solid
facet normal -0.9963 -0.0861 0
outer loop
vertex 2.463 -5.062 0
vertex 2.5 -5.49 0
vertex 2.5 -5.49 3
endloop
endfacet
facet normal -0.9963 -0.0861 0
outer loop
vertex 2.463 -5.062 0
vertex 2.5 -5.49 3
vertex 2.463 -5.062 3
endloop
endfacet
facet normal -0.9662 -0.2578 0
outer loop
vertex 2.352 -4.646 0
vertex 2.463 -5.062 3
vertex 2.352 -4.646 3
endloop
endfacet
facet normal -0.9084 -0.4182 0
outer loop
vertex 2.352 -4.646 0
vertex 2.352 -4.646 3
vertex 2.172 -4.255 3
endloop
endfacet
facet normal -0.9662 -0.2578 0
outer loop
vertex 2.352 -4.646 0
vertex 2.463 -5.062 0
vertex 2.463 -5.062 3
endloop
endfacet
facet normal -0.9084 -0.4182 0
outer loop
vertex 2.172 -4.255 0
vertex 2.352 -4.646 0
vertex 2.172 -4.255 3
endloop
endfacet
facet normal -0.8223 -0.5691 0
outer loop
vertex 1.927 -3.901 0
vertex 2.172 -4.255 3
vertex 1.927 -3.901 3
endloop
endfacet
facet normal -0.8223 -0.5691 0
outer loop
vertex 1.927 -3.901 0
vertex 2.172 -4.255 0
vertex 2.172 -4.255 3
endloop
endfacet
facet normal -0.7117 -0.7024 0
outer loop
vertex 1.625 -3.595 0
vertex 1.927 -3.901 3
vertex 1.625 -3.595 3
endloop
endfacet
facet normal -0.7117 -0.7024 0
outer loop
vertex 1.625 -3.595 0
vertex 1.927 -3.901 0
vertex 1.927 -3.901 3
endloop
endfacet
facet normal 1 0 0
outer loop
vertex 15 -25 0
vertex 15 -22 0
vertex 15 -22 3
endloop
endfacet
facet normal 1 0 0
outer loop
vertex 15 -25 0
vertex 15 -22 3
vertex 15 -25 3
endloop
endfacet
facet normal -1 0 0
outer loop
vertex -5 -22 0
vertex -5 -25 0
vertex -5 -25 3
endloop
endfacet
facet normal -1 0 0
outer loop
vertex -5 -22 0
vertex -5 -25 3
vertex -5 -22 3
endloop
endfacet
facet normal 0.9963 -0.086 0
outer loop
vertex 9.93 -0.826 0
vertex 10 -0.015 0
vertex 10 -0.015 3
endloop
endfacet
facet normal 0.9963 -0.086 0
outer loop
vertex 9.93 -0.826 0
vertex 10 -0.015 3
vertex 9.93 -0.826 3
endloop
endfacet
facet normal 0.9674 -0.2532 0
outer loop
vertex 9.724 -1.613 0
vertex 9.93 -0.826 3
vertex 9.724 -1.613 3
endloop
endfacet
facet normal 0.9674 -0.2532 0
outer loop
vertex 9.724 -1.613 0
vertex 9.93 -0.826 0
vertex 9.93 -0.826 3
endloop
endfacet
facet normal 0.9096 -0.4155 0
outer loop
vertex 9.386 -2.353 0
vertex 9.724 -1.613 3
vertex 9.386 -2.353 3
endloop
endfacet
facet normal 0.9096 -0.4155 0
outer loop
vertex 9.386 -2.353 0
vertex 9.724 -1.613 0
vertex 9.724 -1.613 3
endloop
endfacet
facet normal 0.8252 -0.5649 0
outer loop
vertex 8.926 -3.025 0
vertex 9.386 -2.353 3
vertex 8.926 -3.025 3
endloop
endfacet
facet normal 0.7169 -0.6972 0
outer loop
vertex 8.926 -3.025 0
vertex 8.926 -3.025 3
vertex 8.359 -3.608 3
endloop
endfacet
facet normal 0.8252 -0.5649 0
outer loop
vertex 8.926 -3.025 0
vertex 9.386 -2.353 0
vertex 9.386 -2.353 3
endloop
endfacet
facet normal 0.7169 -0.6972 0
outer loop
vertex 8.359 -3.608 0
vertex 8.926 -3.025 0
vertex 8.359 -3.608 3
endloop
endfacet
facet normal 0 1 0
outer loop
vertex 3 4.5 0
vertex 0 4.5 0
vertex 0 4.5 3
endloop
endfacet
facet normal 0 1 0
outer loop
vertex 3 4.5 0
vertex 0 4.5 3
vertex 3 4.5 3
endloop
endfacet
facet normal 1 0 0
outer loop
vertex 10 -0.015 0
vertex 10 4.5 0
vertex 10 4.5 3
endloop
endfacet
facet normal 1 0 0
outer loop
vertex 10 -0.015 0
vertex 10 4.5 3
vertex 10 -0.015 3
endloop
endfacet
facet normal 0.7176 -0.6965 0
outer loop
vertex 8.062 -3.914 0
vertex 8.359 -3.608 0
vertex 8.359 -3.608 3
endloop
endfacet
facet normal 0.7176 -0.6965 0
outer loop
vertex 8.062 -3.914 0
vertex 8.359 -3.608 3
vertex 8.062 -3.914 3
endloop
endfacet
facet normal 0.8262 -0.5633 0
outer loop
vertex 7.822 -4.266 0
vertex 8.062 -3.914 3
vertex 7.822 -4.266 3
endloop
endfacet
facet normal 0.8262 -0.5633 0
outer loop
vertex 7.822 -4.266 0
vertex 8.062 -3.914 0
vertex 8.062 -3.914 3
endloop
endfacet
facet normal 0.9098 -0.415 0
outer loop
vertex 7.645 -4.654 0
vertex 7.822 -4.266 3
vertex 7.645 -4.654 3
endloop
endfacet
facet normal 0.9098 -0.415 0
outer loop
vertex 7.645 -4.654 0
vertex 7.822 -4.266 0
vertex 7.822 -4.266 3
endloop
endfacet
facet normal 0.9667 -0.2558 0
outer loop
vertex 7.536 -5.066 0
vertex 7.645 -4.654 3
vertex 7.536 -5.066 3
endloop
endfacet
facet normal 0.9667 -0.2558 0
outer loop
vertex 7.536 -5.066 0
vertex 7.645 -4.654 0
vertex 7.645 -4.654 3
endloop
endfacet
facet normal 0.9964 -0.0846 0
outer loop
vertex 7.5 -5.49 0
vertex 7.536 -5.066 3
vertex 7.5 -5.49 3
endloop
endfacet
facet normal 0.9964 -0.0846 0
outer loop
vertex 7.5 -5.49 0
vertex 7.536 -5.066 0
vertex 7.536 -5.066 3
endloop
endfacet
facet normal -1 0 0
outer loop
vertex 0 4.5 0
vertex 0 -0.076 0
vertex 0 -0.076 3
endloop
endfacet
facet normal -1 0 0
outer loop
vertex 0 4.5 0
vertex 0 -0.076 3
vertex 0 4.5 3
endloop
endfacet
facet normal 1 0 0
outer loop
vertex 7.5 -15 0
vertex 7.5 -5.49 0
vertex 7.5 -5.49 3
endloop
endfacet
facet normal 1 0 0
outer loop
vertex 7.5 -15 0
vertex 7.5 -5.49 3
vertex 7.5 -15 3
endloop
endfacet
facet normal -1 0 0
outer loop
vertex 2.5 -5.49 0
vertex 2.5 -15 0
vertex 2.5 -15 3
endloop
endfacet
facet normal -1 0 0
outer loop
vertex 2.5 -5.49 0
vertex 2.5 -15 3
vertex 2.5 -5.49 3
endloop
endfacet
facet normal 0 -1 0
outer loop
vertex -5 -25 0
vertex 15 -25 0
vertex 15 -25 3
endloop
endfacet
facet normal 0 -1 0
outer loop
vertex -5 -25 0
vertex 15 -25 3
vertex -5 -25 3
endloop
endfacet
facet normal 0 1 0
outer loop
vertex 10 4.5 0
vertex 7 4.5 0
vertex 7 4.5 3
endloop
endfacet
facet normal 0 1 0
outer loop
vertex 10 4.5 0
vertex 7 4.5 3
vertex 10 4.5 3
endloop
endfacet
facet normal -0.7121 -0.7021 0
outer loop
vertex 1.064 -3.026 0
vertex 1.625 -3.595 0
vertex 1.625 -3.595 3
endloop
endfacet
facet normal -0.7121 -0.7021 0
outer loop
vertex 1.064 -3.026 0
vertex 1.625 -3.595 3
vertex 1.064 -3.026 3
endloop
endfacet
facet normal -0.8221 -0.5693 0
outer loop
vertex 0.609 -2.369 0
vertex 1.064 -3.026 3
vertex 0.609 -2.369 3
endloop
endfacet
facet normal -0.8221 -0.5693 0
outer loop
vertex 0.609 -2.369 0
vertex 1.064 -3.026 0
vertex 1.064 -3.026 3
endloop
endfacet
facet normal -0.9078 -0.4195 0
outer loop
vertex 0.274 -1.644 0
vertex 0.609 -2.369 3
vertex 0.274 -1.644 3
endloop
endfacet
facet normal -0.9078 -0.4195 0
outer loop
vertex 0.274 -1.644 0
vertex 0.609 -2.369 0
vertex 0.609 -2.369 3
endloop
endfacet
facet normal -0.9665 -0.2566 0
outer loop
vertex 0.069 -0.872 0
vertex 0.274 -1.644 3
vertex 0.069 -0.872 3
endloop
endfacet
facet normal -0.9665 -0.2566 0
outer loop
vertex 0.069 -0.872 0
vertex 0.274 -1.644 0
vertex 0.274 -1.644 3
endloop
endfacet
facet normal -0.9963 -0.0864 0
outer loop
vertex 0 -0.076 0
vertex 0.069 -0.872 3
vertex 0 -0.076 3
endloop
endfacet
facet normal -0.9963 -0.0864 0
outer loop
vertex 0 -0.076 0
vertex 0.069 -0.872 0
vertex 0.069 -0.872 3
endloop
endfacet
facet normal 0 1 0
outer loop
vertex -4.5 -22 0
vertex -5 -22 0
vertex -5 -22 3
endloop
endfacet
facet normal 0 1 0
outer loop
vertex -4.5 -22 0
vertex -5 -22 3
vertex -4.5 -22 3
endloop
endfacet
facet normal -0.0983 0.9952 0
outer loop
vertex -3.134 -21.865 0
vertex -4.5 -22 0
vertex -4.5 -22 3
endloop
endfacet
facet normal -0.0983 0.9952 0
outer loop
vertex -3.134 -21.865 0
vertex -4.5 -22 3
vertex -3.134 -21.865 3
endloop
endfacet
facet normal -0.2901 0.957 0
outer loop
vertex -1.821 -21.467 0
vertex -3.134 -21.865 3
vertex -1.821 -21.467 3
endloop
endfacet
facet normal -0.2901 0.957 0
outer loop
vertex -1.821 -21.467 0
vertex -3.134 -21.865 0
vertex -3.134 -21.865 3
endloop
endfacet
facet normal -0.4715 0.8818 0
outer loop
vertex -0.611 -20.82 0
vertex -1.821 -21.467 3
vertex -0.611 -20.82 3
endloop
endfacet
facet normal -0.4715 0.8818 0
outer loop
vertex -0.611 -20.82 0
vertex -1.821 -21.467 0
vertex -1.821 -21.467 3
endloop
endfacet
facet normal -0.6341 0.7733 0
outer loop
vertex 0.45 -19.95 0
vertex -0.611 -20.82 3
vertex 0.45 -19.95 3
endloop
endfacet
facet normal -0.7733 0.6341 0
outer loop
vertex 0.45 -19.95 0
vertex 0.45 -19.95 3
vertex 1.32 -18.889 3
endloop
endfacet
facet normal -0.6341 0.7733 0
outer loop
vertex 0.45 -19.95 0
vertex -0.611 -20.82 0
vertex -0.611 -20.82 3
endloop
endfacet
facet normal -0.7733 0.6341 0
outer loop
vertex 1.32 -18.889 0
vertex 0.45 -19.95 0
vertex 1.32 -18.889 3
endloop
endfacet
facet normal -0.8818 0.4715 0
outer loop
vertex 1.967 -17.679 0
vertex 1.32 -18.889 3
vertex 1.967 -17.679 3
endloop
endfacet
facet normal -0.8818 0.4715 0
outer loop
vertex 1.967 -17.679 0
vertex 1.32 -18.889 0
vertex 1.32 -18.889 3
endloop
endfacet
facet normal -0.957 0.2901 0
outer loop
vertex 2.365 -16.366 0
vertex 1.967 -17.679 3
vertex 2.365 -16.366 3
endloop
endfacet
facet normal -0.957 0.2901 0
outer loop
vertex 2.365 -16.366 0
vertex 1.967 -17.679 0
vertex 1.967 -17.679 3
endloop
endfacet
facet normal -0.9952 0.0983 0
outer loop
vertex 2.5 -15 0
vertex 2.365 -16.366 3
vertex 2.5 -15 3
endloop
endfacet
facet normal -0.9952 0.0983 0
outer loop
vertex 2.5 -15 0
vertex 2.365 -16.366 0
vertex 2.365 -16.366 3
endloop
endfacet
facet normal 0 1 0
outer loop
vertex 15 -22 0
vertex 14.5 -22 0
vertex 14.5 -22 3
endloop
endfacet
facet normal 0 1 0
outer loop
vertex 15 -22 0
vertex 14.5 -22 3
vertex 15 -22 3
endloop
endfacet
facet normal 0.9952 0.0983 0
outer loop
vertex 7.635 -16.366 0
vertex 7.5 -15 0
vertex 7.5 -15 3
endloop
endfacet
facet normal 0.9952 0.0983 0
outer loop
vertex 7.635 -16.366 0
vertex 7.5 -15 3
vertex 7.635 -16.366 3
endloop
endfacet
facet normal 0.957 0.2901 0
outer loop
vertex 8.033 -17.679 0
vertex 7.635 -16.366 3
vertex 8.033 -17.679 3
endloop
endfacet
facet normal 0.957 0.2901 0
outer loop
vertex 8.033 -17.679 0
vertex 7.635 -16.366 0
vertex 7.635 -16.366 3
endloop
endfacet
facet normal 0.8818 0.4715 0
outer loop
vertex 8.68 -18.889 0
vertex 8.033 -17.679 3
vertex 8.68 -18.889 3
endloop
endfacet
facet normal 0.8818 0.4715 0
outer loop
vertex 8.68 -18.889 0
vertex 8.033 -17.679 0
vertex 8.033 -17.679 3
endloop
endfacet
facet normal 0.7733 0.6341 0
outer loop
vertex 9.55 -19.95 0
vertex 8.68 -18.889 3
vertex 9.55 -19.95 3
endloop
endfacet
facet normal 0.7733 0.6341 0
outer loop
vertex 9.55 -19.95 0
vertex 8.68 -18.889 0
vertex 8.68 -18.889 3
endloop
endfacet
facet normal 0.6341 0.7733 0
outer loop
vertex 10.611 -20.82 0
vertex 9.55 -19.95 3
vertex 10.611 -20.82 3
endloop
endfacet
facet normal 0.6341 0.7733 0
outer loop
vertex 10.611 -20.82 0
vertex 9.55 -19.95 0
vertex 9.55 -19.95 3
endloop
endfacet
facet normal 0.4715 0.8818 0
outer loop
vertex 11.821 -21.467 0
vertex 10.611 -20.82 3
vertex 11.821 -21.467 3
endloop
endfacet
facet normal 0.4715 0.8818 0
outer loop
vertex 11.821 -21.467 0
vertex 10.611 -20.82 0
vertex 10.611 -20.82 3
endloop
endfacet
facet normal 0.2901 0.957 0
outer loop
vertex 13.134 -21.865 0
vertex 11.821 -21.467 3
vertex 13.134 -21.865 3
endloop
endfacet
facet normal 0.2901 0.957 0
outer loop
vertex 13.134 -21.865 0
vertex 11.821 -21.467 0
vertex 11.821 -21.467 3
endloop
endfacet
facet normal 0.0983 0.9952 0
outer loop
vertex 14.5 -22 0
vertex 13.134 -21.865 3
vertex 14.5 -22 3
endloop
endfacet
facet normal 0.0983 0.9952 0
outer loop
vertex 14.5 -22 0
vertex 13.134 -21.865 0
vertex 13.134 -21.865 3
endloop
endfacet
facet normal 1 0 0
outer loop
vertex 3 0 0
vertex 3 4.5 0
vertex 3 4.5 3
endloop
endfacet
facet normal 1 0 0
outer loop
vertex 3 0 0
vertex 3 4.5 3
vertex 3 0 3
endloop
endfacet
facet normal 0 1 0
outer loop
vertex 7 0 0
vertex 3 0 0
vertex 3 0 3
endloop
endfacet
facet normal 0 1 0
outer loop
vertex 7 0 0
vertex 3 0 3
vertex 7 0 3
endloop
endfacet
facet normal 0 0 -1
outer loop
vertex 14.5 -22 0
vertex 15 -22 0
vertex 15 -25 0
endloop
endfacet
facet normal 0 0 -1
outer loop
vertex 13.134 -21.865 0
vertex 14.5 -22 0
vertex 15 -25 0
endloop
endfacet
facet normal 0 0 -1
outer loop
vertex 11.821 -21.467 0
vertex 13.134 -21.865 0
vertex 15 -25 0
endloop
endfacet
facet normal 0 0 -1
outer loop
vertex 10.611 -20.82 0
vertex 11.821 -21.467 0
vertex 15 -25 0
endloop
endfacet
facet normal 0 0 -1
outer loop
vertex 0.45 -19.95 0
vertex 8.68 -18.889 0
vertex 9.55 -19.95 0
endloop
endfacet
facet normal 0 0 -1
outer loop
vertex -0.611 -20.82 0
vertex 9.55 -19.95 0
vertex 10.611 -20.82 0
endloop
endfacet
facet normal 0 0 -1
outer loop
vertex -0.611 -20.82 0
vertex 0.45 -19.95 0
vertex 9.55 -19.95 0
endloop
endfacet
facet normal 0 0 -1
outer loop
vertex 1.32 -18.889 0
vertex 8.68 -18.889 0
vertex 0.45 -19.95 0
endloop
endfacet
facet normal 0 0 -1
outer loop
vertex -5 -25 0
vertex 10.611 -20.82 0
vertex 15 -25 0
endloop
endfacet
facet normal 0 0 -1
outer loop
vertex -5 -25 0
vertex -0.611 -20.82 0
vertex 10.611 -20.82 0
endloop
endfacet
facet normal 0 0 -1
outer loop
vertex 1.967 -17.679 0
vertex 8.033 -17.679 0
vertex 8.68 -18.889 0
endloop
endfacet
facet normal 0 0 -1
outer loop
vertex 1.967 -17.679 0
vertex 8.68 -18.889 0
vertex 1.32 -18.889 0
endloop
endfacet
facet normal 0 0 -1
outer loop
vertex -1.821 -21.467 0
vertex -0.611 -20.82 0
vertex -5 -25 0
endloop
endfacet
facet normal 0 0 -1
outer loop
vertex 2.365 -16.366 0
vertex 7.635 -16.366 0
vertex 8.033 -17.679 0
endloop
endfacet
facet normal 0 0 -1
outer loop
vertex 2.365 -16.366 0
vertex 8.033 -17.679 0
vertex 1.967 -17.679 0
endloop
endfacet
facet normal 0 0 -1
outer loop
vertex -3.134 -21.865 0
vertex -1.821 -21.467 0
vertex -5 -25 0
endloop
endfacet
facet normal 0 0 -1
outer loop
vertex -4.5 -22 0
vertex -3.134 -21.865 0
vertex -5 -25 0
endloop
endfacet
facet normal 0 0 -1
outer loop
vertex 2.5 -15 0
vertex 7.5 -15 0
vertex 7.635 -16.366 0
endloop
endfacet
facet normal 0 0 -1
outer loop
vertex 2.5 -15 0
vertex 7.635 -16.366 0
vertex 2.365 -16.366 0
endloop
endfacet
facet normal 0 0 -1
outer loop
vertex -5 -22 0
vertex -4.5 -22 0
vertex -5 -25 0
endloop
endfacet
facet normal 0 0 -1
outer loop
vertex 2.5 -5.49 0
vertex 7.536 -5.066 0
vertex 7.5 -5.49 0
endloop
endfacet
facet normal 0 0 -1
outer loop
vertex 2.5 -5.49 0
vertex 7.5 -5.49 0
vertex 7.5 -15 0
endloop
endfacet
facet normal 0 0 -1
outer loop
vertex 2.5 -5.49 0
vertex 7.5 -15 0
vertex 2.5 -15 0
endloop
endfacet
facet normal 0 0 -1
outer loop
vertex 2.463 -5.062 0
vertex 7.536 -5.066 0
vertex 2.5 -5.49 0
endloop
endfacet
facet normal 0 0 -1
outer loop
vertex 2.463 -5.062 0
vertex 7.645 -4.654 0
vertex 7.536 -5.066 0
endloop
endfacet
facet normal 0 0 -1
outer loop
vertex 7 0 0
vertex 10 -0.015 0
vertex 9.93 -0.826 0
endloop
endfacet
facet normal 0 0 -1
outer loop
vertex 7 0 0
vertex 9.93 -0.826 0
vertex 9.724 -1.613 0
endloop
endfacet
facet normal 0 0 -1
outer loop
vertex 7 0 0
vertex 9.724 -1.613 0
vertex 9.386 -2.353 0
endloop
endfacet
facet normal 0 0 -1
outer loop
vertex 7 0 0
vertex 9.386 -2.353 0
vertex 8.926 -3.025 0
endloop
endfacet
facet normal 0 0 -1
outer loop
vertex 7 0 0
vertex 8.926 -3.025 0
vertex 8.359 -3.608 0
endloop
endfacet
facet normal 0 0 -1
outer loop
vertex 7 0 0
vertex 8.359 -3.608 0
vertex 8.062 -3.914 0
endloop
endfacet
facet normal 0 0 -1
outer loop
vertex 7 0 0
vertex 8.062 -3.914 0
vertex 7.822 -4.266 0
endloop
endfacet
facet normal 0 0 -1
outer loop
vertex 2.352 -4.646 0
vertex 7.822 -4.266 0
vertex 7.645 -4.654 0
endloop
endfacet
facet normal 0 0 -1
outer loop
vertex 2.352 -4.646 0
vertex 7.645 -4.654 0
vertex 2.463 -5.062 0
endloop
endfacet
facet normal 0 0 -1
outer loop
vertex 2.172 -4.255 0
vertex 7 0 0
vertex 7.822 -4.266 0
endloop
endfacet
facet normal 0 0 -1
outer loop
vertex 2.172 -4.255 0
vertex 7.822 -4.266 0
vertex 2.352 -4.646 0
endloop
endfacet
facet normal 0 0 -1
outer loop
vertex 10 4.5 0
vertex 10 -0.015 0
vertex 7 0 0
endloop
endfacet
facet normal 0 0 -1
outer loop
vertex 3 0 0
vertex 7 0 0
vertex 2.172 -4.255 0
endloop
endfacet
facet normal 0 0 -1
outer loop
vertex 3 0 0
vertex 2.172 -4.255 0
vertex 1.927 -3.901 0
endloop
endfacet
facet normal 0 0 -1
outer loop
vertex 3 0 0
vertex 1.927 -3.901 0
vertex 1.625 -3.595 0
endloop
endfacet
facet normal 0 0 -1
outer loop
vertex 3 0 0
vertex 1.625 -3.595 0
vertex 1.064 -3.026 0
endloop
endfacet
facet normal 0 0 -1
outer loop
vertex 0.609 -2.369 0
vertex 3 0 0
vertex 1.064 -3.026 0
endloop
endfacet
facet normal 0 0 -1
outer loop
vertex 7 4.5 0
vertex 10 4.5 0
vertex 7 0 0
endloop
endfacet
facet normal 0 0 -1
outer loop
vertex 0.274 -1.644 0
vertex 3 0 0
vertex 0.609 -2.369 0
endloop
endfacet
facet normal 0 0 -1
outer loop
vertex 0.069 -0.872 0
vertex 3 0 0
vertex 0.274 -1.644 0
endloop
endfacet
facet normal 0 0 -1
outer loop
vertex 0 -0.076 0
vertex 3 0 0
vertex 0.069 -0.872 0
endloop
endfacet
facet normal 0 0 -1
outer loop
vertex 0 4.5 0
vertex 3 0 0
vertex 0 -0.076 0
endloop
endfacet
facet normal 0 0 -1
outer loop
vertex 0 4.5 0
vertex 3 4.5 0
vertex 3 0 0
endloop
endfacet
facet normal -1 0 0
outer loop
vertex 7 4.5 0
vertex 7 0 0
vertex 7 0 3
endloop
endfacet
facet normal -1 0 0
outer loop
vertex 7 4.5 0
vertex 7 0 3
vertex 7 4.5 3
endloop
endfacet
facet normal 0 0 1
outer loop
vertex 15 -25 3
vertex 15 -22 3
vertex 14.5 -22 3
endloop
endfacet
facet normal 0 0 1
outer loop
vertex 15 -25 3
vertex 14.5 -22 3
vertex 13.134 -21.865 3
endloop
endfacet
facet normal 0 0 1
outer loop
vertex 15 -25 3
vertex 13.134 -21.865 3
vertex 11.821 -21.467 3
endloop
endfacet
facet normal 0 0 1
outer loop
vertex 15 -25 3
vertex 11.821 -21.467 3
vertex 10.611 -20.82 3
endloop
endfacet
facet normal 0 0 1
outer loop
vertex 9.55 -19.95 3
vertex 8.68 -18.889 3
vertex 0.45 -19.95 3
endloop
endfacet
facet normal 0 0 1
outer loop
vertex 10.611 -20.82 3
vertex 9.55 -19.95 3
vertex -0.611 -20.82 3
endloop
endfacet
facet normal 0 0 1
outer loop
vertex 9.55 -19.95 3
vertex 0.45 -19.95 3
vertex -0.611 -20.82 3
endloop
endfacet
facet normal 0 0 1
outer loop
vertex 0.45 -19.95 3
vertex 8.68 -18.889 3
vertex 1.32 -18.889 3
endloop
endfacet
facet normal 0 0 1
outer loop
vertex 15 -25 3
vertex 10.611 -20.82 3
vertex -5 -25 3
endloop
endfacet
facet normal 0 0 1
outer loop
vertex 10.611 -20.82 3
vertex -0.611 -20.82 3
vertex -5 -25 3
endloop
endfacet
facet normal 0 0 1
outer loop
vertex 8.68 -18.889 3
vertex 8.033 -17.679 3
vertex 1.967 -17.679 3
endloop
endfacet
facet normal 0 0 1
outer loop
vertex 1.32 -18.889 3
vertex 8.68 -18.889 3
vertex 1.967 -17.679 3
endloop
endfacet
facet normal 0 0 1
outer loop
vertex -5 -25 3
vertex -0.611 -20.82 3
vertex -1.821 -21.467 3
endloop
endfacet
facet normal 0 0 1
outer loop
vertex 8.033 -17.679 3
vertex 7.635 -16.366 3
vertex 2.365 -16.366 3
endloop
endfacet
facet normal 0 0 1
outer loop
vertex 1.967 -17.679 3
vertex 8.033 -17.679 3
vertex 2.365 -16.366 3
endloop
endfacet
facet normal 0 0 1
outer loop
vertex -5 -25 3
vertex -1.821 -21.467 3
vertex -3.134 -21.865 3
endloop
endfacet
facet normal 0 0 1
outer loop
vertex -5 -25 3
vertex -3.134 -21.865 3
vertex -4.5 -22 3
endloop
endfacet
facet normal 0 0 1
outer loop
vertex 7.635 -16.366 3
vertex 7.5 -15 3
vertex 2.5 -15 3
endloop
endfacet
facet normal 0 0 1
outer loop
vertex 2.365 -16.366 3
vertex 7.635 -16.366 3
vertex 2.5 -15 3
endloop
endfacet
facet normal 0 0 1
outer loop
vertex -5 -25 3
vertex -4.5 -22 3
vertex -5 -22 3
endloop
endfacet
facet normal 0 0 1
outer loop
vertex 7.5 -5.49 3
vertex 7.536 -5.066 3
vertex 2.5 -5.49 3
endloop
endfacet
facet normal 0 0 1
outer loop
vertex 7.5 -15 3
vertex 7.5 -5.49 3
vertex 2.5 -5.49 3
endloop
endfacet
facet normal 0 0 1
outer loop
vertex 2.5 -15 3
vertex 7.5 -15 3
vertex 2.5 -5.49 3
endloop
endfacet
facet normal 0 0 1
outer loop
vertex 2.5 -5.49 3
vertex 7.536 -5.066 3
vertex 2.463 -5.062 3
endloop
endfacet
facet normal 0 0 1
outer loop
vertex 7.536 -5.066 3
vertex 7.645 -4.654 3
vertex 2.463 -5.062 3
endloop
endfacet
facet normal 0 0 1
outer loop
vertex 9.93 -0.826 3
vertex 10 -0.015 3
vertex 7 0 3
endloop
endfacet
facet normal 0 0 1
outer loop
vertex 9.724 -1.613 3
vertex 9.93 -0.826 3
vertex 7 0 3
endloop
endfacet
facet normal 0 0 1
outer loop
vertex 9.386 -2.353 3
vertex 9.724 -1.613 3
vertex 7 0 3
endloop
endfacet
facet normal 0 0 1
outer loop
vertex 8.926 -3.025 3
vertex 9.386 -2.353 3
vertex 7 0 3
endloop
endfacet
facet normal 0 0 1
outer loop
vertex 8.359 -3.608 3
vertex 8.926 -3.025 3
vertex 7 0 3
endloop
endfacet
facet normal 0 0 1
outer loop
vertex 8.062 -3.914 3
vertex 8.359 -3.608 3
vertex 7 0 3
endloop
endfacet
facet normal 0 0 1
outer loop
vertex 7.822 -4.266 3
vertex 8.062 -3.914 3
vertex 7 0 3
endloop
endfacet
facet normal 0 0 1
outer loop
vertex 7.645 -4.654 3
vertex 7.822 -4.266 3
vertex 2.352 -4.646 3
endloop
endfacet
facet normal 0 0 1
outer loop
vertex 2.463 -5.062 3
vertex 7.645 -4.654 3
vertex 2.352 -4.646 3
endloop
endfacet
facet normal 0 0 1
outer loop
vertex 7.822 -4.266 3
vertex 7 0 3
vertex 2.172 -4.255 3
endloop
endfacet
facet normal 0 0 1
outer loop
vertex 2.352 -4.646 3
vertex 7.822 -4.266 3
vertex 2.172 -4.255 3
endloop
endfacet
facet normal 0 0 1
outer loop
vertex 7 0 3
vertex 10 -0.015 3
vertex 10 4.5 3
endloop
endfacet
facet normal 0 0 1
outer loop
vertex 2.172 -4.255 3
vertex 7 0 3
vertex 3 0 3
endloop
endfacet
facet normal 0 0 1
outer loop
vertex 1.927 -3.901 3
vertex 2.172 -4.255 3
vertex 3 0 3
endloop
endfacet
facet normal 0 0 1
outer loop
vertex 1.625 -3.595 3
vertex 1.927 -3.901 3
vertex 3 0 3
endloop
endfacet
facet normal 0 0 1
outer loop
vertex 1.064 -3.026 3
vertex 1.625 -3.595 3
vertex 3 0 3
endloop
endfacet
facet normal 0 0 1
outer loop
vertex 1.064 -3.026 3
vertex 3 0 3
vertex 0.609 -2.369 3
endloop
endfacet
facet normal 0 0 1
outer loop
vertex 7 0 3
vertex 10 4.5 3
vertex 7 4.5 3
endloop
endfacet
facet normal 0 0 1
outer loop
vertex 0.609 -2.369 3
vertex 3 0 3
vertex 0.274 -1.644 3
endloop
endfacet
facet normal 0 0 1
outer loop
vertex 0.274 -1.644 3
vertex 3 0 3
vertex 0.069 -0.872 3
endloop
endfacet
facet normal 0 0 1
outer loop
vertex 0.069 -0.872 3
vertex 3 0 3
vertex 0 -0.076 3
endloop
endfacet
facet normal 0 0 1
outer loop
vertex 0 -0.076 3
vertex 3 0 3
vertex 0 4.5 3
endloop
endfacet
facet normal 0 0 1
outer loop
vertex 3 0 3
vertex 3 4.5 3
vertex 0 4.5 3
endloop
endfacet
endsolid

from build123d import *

# Parameters (mm, degrees)
RESSALTO_EXTRUS_O1_DEPTH = 3


with BuildPart() as part:
    # Esboço1 → Ressalto-extrusão1 (new body)
    with BuildSketch(Plane.XY):
        with BuildLine():
            Line((3, 0), (7, 0))
            Line((7, 0), (7, 3))
            Line((7, 3), (7, 4.5))
            Line((7, 4.5), (10, 4.5))
            Line((10, 4.5), (10, 3))
            Line((10, 3), (10, 0))
            Line((10, 0), (10, -0.015366586))
            ThreePointArc((10, -0.015366586), (9.570424226, -1.990324177), (8.359319479, -3.608415065))
            ThreePointArc((8.359319479, -3.608415065), (7.72499373, -4.455903043), (7.5, -5.490302797))
            Line((7.5, -5.490302797), (7.5, -6.25))
            Line((7.5, -6.25), (7.5, -12.5))
            Line((7.5, -12.5), (7.5, -15))
            ThreePointArc((7.5, -15), (9.550252532, -19.949747468), (14.5, -22))
            Line((14.5, -22), (15, -22))
            Line((15, -22), (15, -25))
            Line((15, -25), (-5, -25))
            Line((-5, -25), (-5, -22))
            Line((-5, -22), (-4.5, -22))
            ThreePointArc((-4.5, -22), (0.449747468, -19.949747468), (2.5, -15))
            Line((2.5, -15), (2.5, -12.5))
            Line((2.5, -12.5), (2.5, -6.25))
            Line((2.5, -6.25), (2.5, -5.490302797))
            ThreePointArc((2.5, -5.490302797), (2.270627847, -4.446367624), (1.62476455, -3.594738109))
            ThreePointArc((1.62476455, -3.594738109), (0.425800558, -2.013795009), (0, -0.075860639))
            Line((0, -0.075860639), (0, 0))
            Line((0, 0), (0, 3))
            Line((0, 3), (0, 4.5))
            Line((0, 4.5), (3, 4.5))
            Line((3, 4.5), (3, 3))
            Line((3, 3), (3, 0))
        make_face()
    extrude(amount=RESSALTO_EXTRUS_O1_DEPTH)


solid = part.part
